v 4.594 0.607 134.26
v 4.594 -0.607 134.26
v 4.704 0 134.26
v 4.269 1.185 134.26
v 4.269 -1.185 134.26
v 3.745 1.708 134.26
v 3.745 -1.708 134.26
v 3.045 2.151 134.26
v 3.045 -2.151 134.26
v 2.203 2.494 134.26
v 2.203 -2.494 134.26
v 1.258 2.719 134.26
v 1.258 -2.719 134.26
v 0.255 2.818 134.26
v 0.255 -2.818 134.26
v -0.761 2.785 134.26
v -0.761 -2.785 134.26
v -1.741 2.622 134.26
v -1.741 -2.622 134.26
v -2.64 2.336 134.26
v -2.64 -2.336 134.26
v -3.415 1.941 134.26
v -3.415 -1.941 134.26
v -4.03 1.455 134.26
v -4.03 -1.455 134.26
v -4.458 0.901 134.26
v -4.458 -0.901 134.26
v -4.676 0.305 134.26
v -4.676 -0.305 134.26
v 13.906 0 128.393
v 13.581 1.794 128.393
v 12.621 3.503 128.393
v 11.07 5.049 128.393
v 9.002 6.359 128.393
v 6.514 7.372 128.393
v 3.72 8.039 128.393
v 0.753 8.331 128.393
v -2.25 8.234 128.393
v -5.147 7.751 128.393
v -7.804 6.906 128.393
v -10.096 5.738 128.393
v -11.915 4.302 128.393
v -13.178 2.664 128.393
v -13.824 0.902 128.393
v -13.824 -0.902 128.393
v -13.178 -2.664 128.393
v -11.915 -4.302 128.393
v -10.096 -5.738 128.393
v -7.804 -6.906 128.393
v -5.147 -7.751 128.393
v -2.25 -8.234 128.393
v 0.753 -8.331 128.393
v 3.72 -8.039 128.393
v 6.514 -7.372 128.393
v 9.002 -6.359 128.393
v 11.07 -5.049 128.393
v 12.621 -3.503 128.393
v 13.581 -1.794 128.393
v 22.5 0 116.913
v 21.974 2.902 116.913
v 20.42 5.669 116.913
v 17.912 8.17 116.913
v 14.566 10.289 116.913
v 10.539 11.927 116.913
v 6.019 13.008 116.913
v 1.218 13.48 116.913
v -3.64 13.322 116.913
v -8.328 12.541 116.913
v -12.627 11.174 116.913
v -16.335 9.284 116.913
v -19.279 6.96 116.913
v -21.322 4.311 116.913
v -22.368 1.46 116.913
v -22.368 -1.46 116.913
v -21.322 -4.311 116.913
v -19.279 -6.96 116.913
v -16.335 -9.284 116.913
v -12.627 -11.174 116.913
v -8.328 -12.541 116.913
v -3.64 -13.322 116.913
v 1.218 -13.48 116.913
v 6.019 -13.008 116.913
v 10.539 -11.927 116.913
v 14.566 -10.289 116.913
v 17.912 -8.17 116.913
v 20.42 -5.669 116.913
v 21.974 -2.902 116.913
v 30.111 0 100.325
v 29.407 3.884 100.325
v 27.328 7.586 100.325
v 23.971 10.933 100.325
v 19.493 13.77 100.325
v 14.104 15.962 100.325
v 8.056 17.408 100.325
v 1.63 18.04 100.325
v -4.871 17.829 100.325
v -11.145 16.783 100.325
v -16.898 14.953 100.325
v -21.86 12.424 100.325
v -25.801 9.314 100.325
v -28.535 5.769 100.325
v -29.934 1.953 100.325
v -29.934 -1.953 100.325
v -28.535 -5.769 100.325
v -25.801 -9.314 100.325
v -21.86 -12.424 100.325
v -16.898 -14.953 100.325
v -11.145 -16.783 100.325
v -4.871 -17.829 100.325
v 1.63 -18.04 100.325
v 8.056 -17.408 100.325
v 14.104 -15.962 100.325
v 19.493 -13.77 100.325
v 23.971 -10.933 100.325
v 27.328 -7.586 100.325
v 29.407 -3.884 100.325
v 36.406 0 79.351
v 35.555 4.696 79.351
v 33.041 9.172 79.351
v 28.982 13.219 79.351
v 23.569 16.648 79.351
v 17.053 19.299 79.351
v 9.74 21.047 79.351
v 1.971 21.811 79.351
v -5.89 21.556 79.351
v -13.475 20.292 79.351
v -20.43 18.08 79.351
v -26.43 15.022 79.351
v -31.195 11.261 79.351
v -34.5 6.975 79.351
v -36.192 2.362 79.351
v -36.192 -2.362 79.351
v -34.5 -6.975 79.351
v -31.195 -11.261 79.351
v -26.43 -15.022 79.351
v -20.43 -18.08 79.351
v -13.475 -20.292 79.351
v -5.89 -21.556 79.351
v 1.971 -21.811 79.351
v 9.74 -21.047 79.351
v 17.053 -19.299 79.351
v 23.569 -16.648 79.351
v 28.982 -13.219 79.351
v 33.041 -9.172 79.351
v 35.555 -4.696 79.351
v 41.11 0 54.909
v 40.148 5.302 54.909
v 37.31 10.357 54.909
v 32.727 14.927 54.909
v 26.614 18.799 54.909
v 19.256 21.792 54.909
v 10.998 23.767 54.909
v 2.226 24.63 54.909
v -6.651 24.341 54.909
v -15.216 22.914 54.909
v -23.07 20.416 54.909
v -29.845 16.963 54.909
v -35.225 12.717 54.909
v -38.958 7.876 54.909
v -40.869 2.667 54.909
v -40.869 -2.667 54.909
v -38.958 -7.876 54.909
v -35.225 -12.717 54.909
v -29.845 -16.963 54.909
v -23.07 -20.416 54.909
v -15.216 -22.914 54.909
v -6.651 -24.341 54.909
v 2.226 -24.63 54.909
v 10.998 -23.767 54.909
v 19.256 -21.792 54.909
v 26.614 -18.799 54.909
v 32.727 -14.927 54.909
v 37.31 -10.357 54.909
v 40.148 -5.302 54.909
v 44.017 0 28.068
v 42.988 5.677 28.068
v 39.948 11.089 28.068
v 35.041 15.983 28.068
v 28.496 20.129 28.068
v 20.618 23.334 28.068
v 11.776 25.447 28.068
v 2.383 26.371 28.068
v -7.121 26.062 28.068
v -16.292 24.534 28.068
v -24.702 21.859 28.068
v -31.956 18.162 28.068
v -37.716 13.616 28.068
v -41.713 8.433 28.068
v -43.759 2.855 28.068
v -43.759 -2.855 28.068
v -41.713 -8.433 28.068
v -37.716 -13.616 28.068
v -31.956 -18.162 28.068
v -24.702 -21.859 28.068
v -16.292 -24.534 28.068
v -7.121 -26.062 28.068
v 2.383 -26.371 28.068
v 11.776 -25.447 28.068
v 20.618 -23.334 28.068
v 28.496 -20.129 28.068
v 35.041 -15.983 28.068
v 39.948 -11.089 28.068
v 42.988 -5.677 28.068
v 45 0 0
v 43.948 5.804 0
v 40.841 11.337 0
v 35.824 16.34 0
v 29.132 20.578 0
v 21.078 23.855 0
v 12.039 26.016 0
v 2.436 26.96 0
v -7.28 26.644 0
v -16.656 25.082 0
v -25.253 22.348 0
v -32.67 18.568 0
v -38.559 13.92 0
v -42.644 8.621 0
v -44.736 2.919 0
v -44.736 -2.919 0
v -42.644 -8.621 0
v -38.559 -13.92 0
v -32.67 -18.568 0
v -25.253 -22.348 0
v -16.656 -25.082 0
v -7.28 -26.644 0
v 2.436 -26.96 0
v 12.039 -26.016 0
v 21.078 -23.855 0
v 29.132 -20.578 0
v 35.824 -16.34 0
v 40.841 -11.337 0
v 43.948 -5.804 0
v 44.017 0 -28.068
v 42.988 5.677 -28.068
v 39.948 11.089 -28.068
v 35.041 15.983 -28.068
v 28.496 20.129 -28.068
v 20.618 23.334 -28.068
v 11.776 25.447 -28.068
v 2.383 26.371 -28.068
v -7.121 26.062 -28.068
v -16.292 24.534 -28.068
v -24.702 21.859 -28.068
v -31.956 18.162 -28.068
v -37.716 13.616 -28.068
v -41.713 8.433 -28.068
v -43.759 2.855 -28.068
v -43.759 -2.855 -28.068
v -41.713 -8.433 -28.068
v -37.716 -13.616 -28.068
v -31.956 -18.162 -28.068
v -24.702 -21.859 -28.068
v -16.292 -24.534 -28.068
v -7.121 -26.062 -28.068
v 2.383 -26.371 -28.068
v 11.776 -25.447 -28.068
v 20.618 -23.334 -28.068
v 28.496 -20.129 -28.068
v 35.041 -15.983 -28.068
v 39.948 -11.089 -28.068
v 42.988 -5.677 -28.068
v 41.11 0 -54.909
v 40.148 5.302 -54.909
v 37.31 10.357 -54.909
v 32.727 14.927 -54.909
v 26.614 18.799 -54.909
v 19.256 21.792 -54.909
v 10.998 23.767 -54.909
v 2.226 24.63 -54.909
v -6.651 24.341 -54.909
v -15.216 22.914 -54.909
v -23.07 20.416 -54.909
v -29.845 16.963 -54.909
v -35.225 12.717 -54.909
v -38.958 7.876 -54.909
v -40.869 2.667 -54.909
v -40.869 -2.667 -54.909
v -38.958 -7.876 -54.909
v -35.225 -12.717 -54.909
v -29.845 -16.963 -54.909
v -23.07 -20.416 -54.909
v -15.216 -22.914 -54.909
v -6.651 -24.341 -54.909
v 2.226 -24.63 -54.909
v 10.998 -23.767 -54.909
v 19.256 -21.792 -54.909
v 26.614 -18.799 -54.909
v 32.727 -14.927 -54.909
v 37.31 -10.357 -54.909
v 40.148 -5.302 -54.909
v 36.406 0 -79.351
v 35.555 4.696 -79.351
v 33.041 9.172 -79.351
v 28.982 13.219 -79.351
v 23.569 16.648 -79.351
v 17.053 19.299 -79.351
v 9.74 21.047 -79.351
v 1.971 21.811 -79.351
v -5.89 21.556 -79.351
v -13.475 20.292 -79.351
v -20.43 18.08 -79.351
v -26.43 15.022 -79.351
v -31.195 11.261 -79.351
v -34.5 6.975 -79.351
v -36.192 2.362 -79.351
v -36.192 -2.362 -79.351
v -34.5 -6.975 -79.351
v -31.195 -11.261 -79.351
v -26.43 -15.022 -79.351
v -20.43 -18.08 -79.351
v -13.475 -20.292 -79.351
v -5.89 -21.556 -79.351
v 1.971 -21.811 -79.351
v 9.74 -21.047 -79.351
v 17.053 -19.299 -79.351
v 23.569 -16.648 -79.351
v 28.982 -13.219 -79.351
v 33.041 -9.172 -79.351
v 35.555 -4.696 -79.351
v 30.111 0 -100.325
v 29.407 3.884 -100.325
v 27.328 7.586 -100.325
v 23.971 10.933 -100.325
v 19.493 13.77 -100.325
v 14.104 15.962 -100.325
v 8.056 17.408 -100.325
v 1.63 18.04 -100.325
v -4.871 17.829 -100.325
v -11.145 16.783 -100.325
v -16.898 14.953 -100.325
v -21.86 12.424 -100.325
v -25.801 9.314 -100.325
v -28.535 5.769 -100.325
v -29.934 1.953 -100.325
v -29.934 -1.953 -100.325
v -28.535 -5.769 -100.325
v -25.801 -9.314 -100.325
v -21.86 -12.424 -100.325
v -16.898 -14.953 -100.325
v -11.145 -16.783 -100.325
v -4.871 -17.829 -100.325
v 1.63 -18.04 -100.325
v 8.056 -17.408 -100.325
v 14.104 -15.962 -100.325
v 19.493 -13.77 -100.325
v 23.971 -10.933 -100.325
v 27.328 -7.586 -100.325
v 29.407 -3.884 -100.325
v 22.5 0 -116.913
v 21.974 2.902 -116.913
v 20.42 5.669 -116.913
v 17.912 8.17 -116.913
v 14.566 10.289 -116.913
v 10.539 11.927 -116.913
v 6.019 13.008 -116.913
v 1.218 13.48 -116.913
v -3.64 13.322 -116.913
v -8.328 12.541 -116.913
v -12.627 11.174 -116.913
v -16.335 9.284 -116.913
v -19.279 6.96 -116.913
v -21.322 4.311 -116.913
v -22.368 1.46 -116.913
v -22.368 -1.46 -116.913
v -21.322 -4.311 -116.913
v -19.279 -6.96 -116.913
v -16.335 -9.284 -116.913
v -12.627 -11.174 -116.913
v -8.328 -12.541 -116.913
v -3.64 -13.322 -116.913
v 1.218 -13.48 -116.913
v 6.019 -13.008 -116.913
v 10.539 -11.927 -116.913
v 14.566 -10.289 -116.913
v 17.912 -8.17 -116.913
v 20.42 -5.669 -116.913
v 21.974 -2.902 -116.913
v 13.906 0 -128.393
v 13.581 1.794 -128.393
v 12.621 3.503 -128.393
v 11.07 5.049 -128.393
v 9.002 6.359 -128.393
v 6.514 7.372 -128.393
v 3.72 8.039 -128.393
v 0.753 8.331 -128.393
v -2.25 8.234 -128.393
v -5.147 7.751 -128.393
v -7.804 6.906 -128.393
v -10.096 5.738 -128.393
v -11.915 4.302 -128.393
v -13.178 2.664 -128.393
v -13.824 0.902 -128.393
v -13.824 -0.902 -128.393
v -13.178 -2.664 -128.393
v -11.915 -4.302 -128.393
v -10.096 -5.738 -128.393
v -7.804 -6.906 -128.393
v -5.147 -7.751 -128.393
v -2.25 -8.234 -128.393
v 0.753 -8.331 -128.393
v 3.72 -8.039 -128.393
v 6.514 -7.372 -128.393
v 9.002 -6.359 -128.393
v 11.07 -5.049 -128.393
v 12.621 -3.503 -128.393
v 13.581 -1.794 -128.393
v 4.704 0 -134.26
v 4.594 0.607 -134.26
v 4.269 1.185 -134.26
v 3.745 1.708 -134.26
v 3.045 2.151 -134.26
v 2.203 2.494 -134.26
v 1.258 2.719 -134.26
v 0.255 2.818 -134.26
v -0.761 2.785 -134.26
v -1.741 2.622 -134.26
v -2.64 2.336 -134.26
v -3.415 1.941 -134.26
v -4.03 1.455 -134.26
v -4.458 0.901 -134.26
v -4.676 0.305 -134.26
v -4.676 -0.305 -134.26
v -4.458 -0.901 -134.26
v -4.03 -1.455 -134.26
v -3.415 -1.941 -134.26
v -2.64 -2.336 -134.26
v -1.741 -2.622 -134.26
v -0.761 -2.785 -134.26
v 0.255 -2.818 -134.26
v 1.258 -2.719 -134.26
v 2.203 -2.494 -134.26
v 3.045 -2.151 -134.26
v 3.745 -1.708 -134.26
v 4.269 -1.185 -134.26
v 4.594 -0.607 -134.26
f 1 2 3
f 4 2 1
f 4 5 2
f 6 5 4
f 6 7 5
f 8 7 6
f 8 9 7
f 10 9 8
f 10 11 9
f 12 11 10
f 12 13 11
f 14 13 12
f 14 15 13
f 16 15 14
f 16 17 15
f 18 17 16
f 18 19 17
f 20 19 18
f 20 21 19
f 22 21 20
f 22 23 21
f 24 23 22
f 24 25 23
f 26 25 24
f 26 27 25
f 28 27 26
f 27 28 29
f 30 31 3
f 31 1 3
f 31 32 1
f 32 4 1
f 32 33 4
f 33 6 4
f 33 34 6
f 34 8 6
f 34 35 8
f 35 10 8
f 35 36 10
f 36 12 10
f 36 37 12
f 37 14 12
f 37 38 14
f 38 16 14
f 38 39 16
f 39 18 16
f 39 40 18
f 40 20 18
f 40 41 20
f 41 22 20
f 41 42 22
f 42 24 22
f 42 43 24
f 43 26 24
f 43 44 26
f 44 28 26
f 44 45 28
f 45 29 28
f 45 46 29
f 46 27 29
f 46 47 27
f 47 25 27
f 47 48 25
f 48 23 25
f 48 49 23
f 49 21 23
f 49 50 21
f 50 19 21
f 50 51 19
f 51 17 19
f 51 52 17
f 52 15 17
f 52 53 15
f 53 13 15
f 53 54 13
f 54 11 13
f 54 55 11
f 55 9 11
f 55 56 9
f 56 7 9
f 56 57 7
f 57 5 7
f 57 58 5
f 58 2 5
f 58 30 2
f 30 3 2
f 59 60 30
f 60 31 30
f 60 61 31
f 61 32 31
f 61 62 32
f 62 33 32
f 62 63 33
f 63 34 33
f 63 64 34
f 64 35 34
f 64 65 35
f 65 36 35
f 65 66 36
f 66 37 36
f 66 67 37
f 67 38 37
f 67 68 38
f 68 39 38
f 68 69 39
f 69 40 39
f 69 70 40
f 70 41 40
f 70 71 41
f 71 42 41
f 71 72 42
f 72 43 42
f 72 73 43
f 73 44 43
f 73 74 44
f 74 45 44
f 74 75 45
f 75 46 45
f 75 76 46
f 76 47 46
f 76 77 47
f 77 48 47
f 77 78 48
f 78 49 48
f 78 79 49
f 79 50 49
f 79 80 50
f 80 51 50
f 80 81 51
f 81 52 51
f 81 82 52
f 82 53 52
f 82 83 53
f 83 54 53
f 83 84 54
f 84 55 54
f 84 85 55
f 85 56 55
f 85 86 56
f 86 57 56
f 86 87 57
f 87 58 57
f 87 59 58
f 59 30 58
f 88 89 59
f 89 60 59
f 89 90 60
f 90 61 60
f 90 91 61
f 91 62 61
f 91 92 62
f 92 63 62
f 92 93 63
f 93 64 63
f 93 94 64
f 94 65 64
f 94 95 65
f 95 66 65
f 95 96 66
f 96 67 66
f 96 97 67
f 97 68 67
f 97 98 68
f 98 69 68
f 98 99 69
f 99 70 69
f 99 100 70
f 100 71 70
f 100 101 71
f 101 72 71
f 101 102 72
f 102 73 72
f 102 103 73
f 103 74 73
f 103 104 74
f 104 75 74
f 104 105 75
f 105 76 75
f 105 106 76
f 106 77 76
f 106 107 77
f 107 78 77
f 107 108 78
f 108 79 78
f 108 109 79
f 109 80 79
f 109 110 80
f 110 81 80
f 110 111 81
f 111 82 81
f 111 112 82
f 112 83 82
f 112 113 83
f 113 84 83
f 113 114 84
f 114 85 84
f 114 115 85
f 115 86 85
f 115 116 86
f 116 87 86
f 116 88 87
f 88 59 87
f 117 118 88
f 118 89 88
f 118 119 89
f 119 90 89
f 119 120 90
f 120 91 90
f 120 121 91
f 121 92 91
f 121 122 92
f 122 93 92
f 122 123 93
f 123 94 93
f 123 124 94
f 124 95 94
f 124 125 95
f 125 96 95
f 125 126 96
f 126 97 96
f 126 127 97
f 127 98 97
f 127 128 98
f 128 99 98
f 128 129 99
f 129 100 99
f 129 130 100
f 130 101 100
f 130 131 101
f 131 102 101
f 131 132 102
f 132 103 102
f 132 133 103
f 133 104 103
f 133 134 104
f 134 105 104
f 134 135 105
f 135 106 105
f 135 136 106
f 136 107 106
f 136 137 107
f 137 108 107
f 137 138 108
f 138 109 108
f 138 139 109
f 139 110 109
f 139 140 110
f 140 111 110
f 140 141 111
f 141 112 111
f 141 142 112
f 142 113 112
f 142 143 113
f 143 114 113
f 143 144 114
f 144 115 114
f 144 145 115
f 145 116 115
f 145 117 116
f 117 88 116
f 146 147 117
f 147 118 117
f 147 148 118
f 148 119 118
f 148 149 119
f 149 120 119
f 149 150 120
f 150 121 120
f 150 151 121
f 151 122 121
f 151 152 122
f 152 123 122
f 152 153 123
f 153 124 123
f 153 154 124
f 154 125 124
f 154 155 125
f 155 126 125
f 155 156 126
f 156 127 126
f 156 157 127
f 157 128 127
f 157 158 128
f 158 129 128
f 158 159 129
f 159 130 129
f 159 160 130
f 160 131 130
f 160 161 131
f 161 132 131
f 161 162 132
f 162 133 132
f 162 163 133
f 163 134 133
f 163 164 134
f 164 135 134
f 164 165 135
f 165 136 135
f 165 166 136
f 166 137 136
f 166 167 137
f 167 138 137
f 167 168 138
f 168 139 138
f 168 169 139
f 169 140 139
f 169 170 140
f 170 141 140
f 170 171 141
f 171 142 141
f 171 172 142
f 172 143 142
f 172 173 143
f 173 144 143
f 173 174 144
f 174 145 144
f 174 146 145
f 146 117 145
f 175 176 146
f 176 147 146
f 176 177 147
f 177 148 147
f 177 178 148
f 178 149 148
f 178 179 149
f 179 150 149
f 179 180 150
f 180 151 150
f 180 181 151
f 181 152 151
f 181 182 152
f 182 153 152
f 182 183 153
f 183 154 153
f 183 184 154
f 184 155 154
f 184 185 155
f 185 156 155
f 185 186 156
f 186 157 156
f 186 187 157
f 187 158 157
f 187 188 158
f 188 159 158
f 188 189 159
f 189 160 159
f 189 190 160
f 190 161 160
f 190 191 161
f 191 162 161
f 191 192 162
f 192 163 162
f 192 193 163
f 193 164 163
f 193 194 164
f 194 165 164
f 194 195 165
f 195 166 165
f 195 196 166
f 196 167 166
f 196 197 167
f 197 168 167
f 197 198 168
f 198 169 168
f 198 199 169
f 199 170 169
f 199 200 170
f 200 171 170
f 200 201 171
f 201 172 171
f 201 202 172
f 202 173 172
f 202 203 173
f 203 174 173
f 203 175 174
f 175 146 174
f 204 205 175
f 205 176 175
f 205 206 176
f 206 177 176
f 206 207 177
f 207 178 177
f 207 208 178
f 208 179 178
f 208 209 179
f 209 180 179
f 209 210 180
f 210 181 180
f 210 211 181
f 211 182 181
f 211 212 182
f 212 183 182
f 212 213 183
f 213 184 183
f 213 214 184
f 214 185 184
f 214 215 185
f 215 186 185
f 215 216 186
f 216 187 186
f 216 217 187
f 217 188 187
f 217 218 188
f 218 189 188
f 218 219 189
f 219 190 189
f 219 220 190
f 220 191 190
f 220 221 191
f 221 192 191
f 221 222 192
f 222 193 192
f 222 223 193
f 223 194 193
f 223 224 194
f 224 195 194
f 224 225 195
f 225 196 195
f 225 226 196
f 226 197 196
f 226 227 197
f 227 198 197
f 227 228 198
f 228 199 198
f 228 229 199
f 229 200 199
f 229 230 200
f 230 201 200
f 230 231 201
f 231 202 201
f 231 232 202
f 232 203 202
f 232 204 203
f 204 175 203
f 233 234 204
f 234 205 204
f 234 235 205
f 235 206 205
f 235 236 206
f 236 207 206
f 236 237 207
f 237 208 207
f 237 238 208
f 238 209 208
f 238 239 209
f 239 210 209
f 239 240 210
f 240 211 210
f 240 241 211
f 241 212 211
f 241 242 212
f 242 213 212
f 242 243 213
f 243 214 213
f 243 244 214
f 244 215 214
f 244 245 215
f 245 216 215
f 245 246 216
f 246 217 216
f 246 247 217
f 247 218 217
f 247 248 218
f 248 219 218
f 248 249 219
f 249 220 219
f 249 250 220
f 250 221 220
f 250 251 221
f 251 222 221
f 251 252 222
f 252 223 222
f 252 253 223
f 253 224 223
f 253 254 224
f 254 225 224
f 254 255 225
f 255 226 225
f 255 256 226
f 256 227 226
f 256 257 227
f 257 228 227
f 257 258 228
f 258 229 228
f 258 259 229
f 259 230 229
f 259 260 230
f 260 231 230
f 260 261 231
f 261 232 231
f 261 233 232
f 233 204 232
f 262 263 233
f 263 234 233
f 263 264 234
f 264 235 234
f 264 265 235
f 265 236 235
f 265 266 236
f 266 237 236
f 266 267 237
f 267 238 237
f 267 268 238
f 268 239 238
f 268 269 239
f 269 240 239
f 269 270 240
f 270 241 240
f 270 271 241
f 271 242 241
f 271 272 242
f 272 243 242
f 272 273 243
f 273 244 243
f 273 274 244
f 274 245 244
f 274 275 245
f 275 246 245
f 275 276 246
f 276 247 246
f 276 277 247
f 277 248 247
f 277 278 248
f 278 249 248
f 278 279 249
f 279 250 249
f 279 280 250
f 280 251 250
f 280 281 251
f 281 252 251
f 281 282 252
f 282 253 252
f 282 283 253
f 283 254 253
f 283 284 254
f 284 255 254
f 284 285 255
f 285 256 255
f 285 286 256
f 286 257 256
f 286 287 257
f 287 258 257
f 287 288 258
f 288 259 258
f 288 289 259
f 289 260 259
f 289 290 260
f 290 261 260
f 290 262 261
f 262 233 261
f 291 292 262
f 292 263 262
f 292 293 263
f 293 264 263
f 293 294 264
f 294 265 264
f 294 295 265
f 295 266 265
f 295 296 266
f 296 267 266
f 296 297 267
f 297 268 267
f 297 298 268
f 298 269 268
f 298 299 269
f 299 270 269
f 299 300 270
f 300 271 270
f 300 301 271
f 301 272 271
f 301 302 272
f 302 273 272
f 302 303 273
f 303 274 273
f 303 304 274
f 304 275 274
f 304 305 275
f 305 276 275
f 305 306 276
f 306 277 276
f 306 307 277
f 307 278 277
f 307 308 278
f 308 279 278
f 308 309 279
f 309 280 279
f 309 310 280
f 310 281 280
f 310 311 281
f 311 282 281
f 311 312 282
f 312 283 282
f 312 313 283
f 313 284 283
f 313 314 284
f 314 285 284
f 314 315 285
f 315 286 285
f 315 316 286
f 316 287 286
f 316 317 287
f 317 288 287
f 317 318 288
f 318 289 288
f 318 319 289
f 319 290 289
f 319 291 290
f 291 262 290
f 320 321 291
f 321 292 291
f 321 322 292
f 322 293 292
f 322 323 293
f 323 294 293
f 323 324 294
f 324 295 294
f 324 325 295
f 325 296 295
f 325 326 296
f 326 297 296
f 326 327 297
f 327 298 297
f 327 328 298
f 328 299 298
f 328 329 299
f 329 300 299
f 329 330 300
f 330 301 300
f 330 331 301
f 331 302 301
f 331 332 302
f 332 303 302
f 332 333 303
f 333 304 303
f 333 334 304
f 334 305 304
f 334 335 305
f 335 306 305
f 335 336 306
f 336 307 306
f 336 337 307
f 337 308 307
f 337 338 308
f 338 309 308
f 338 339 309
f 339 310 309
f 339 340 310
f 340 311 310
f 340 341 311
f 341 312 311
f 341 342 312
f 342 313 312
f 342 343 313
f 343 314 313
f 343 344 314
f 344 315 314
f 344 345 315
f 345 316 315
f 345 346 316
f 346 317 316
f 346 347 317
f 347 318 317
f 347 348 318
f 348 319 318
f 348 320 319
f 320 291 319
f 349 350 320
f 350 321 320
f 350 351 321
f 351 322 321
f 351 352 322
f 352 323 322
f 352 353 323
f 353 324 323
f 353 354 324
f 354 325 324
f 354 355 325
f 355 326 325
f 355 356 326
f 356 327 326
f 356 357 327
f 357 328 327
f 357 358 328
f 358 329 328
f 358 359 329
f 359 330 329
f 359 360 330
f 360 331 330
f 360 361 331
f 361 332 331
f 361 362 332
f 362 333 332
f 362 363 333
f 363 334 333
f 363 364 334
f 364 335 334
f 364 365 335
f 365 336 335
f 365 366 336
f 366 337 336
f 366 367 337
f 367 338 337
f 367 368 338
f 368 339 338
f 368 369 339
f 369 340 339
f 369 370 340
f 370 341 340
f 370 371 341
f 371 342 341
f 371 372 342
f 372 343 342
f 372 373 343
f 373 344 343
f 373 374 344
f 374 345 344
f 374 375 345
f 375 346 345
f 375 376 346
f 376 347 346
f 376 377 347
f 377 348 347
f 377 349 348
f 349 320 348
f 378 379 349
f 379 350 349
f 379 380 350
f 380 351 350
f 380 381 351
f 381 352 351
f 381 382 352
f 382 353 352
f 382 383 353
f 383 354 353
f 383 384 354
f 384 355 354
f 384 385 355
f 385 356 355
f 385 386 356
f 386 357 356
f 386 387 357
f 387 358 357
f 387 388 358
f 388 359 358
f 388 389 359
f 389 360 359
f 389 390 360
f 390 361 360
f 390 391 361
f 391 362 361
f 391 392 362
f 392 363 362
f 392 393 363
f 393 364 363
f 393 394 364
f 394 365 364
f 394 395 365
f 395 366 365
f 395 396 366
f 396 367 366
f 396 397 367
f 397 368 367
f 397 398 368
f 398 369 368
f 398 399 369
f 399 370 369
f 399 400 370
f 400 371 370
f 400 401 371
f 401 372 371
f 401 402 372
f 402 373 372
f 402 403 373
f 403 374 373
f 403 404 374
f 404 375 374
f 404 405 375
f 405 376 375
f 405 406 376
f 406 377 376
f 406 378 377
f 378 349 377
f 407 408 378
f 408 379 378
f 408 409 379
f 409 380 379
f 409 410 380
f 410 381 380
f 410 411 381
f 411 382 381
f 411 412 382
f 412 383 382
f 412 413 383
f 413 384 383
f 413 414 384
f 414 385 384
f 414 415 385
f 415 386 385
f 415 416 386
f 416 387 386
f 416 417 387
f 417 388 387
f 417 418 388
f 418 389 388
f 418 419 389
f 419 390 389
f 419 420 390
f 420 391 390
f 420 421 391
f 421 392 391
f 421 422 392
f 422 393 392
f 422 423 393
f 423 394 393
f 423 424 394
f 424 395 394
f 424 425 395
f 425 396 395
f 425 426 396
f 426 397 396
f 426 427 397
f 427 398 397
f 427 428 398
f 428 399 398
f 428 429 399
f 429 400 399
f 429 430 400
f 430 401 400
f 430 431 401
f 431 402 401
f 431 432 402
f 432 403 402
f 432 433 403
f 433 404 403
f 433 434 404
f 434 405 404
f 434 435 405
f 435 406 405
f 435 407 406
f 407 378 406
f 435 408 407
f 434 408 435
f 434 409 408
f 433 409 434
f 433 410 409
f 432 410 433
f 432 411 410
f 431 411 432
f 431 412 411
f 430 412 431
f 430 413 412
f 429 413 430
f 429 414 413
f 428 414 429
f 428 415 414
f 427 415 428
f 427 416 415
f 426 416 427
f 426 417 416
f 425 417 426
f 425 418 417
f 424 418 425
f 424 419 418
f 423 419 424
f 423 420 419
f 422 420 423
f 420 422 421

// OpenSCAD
// Generated by SolidPython 1.0.1 on 2020-07-29 00:46:46


scale(v = [5, 3, 15]) {
	sphere(r = 9);
}
/***********************************************
*********      SolidPython code:      **********
************************************************
 
# import packages: SolidPython
from solid import *
from solid.utils import *
from itertools import chain, combinations, permutations


class Resize:

    def __init__(self, scad_file):
        self.scad_file = scad_file
        #self.scad_file = import_scad(scad_file)
        # cone/cylinder param:
        self.r1 = 0
        self.r2 = 0
        self.h = 0
        # rectangular prism param:
        self.w = 0
        self.l = 0
        # ellipse param:
        self.r = 0

    # import OpenScad code (file name corresponds to shape)


    # classify shape + parameters
    def assign(self, param1, param2, param3):
        if self.scad_file == 'cone.scad':
            self.r1 = param1
            self.r2 = param2
            self.h = param3
        elif self.scad_file == 'cylinder.scad':
            self.r1 = param1
            self.r2 = param2
            self.h = param3
        elif self.scad_file == 'rectangularPrism.scad':
            self.h = param1
            self.l = param2
            self.w = param3
        else:
            self.r = param1
            self.h = param2

    # resize parameters
    def iterate(self):
        x = range(3, 20, 2)
        i = 1
        if self.scad_file == 'cone.scad':
            tempList = list(permutations(x, 2))
            for temp in tempList:
                param1 = temp[0]
                param2 = temp[1]
                filepath = 'produced_scad_files/' + 'cone' + str(param1) + '_' + str(param2) + '_' + '.scad'
                scad_render_to_file(cylinder(h=param1, r1=param2, r2=0), filepath)

        elif self.scad_file == 'cylinder.scad':
            tempList = list(permutations(x, 3))
            for temp in tempList:
                param1 = temp[0]
                param2 = temp[1]
                filepath = 'produced_scad_files/' + 'cylinder' + str(param1) + '_' + str(param2) + '_' + '.scad'
                scad_render_to_file(cylinder(h=param1, r1=param2, r2=param2), filepath)

        elif self.scad_file == 'rectangularPrism.scad':
            tempList = list(permutations(x, 3))
            for temp in tempList:
                param1 = temp[0]
                param2 = temp[1]
                param3 = temp[2]
                filepath = 'produced_scad_files/' + 'rectangularPrism' + str(param1) + '_' + str(param2) + '_' + str(
                    param3) + '.scad'
                scad_render_to_file(cube(size=(param1, param2, param3)), filepath)

        elif self.scad_file == 'ellipse.scad':
            tempList = list(permutations(x, 4))
            for temp in tempList:
                param1 = temp[0]
                param2 = temp[1]
                param3 = temp[2]
                param4 = temp[3]
                filepath = 'produced_scad_files/' + 'ellipse' + str(param1) + '_' + str(param2) + '_' + str(param3) + '_' + str(param4) + '.scad'
                scad_render_to_file(scale([param1, param2, param3])(sphere(r=param4)), filepath)

    def render_to_scadfile(self):
        scad_render_to_file(scad, 'example.scad') 
 
************************************************/
